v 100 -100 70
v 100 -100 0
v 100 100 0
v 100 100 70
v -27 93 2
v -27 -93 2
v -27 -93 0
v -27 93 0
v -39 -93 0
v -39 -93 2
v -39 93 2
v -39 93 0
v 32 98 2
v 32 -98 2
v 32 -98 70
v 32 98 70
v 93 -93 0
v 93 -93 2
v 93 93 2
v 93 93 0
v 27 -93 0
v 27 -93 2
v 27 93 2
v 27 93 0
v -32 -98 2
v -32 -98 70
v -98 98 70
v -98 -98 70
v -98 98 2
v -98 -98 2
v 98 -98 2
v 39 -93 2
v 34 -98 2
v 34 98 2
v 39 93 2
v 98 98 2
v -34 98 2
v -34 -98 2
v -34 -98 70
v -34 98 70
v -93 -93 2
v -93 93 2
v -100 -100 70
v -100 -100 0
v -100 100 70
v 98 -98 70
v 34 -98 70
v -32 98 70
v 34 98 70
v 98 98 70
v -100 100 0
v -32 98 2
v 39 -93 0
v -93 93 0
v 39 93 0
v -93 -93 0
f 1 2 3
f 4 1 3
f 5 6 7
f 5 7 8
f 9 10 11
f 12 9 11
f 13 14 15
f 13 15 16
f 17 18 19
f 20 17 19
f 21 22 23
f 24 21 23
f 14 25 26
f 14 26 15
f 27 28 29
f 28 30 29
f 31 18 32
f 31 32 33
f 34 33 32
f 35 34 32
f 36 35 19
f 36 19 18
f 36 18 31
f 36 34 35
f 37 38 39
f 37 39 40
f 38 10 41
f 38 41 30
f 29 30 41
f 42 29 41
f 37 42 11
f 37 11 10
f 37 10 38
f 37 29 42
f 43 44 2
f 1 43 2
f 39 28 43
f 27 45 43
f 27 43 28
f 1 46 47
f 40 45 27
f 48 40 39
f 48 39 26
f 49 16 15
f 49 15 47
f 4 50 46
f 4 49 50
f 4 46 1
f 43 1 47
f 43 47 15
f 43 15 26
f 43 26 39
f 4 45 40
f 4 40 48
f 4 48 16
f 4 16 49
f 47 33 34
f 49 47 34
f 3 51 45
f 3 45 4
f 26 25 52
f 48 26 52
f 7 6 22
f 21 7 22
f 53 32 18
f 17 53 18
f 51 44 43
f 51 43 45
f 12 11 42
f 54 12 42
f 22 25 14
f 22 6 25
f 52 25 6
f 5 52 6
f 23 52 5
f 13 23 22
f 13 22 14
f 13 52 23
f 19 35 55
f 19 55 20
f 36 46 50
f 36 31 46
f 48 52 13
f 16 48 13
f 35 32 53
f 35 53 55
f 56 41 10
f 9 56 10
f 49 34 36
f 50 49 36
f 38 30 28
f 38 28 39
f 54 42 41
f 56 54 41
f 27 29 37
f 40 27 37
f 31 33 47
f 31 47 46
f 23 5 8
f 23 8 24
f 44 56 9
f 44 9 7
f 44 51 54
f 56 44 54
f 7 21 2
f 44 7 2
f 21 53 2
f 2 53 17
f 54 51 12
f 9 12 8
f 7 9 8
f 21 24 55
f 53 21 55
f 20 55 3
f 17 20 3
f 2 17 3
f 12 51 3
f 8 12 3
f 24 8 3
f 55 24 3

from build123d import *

# Parameters (mm, degrees)
F0_W     = 200
F0_H     = 200
F1_DEPTH = 70
F2_T     = -2
F3_W     = 2
F3_H     = 196
F4_DEPTH = 68
F5_W     = 54
F5_H     = 186
F6_DEPTH = 2


with BuildPart() as f1:
    # F0 (on Top) → F1 (new body)
    with BuildSketch(Plane.XY):
        Rectangle(F0_W, F0_H)
    extrude(amount=F1_DEPTH)

    # F2
    f2_openings = [f1.faces().sort_by_distance(p)[0] for p in [
        (0, 0, 70),
    ]]
    offset(amount=F2_T, openings=f2_openings)

    # F3 (on face) → F4 (join)
    with BuildSketch(Plane.XY.offset(2)):
        with Locations((-33, 0)):
            Rectangle(F3_W, F3_H)
        with Locations((33, 0)):
            Rectangle(F3_W, F3_H)
    extrude(amount=F4_DEPTH)

    # F5 (on face) → F6 (cut, through all)
    with BuildSketch(Plane.XY.offset(2)):
        Polygon((-73, 93), (-93, 93), (-93, 70.5273523927), (-93, 53), (-93, -93), (-39, -93), (-39, 53), (-39, 93), align=None)
        Rectangle(F5_W, F5_H)
        with Locations((66, 0)):
            Rectangle(F5_W, F5_H)
    extrude(amount=-F6_DEPTH, mode=Mode.SUBTRACT)


solid = f1.part
